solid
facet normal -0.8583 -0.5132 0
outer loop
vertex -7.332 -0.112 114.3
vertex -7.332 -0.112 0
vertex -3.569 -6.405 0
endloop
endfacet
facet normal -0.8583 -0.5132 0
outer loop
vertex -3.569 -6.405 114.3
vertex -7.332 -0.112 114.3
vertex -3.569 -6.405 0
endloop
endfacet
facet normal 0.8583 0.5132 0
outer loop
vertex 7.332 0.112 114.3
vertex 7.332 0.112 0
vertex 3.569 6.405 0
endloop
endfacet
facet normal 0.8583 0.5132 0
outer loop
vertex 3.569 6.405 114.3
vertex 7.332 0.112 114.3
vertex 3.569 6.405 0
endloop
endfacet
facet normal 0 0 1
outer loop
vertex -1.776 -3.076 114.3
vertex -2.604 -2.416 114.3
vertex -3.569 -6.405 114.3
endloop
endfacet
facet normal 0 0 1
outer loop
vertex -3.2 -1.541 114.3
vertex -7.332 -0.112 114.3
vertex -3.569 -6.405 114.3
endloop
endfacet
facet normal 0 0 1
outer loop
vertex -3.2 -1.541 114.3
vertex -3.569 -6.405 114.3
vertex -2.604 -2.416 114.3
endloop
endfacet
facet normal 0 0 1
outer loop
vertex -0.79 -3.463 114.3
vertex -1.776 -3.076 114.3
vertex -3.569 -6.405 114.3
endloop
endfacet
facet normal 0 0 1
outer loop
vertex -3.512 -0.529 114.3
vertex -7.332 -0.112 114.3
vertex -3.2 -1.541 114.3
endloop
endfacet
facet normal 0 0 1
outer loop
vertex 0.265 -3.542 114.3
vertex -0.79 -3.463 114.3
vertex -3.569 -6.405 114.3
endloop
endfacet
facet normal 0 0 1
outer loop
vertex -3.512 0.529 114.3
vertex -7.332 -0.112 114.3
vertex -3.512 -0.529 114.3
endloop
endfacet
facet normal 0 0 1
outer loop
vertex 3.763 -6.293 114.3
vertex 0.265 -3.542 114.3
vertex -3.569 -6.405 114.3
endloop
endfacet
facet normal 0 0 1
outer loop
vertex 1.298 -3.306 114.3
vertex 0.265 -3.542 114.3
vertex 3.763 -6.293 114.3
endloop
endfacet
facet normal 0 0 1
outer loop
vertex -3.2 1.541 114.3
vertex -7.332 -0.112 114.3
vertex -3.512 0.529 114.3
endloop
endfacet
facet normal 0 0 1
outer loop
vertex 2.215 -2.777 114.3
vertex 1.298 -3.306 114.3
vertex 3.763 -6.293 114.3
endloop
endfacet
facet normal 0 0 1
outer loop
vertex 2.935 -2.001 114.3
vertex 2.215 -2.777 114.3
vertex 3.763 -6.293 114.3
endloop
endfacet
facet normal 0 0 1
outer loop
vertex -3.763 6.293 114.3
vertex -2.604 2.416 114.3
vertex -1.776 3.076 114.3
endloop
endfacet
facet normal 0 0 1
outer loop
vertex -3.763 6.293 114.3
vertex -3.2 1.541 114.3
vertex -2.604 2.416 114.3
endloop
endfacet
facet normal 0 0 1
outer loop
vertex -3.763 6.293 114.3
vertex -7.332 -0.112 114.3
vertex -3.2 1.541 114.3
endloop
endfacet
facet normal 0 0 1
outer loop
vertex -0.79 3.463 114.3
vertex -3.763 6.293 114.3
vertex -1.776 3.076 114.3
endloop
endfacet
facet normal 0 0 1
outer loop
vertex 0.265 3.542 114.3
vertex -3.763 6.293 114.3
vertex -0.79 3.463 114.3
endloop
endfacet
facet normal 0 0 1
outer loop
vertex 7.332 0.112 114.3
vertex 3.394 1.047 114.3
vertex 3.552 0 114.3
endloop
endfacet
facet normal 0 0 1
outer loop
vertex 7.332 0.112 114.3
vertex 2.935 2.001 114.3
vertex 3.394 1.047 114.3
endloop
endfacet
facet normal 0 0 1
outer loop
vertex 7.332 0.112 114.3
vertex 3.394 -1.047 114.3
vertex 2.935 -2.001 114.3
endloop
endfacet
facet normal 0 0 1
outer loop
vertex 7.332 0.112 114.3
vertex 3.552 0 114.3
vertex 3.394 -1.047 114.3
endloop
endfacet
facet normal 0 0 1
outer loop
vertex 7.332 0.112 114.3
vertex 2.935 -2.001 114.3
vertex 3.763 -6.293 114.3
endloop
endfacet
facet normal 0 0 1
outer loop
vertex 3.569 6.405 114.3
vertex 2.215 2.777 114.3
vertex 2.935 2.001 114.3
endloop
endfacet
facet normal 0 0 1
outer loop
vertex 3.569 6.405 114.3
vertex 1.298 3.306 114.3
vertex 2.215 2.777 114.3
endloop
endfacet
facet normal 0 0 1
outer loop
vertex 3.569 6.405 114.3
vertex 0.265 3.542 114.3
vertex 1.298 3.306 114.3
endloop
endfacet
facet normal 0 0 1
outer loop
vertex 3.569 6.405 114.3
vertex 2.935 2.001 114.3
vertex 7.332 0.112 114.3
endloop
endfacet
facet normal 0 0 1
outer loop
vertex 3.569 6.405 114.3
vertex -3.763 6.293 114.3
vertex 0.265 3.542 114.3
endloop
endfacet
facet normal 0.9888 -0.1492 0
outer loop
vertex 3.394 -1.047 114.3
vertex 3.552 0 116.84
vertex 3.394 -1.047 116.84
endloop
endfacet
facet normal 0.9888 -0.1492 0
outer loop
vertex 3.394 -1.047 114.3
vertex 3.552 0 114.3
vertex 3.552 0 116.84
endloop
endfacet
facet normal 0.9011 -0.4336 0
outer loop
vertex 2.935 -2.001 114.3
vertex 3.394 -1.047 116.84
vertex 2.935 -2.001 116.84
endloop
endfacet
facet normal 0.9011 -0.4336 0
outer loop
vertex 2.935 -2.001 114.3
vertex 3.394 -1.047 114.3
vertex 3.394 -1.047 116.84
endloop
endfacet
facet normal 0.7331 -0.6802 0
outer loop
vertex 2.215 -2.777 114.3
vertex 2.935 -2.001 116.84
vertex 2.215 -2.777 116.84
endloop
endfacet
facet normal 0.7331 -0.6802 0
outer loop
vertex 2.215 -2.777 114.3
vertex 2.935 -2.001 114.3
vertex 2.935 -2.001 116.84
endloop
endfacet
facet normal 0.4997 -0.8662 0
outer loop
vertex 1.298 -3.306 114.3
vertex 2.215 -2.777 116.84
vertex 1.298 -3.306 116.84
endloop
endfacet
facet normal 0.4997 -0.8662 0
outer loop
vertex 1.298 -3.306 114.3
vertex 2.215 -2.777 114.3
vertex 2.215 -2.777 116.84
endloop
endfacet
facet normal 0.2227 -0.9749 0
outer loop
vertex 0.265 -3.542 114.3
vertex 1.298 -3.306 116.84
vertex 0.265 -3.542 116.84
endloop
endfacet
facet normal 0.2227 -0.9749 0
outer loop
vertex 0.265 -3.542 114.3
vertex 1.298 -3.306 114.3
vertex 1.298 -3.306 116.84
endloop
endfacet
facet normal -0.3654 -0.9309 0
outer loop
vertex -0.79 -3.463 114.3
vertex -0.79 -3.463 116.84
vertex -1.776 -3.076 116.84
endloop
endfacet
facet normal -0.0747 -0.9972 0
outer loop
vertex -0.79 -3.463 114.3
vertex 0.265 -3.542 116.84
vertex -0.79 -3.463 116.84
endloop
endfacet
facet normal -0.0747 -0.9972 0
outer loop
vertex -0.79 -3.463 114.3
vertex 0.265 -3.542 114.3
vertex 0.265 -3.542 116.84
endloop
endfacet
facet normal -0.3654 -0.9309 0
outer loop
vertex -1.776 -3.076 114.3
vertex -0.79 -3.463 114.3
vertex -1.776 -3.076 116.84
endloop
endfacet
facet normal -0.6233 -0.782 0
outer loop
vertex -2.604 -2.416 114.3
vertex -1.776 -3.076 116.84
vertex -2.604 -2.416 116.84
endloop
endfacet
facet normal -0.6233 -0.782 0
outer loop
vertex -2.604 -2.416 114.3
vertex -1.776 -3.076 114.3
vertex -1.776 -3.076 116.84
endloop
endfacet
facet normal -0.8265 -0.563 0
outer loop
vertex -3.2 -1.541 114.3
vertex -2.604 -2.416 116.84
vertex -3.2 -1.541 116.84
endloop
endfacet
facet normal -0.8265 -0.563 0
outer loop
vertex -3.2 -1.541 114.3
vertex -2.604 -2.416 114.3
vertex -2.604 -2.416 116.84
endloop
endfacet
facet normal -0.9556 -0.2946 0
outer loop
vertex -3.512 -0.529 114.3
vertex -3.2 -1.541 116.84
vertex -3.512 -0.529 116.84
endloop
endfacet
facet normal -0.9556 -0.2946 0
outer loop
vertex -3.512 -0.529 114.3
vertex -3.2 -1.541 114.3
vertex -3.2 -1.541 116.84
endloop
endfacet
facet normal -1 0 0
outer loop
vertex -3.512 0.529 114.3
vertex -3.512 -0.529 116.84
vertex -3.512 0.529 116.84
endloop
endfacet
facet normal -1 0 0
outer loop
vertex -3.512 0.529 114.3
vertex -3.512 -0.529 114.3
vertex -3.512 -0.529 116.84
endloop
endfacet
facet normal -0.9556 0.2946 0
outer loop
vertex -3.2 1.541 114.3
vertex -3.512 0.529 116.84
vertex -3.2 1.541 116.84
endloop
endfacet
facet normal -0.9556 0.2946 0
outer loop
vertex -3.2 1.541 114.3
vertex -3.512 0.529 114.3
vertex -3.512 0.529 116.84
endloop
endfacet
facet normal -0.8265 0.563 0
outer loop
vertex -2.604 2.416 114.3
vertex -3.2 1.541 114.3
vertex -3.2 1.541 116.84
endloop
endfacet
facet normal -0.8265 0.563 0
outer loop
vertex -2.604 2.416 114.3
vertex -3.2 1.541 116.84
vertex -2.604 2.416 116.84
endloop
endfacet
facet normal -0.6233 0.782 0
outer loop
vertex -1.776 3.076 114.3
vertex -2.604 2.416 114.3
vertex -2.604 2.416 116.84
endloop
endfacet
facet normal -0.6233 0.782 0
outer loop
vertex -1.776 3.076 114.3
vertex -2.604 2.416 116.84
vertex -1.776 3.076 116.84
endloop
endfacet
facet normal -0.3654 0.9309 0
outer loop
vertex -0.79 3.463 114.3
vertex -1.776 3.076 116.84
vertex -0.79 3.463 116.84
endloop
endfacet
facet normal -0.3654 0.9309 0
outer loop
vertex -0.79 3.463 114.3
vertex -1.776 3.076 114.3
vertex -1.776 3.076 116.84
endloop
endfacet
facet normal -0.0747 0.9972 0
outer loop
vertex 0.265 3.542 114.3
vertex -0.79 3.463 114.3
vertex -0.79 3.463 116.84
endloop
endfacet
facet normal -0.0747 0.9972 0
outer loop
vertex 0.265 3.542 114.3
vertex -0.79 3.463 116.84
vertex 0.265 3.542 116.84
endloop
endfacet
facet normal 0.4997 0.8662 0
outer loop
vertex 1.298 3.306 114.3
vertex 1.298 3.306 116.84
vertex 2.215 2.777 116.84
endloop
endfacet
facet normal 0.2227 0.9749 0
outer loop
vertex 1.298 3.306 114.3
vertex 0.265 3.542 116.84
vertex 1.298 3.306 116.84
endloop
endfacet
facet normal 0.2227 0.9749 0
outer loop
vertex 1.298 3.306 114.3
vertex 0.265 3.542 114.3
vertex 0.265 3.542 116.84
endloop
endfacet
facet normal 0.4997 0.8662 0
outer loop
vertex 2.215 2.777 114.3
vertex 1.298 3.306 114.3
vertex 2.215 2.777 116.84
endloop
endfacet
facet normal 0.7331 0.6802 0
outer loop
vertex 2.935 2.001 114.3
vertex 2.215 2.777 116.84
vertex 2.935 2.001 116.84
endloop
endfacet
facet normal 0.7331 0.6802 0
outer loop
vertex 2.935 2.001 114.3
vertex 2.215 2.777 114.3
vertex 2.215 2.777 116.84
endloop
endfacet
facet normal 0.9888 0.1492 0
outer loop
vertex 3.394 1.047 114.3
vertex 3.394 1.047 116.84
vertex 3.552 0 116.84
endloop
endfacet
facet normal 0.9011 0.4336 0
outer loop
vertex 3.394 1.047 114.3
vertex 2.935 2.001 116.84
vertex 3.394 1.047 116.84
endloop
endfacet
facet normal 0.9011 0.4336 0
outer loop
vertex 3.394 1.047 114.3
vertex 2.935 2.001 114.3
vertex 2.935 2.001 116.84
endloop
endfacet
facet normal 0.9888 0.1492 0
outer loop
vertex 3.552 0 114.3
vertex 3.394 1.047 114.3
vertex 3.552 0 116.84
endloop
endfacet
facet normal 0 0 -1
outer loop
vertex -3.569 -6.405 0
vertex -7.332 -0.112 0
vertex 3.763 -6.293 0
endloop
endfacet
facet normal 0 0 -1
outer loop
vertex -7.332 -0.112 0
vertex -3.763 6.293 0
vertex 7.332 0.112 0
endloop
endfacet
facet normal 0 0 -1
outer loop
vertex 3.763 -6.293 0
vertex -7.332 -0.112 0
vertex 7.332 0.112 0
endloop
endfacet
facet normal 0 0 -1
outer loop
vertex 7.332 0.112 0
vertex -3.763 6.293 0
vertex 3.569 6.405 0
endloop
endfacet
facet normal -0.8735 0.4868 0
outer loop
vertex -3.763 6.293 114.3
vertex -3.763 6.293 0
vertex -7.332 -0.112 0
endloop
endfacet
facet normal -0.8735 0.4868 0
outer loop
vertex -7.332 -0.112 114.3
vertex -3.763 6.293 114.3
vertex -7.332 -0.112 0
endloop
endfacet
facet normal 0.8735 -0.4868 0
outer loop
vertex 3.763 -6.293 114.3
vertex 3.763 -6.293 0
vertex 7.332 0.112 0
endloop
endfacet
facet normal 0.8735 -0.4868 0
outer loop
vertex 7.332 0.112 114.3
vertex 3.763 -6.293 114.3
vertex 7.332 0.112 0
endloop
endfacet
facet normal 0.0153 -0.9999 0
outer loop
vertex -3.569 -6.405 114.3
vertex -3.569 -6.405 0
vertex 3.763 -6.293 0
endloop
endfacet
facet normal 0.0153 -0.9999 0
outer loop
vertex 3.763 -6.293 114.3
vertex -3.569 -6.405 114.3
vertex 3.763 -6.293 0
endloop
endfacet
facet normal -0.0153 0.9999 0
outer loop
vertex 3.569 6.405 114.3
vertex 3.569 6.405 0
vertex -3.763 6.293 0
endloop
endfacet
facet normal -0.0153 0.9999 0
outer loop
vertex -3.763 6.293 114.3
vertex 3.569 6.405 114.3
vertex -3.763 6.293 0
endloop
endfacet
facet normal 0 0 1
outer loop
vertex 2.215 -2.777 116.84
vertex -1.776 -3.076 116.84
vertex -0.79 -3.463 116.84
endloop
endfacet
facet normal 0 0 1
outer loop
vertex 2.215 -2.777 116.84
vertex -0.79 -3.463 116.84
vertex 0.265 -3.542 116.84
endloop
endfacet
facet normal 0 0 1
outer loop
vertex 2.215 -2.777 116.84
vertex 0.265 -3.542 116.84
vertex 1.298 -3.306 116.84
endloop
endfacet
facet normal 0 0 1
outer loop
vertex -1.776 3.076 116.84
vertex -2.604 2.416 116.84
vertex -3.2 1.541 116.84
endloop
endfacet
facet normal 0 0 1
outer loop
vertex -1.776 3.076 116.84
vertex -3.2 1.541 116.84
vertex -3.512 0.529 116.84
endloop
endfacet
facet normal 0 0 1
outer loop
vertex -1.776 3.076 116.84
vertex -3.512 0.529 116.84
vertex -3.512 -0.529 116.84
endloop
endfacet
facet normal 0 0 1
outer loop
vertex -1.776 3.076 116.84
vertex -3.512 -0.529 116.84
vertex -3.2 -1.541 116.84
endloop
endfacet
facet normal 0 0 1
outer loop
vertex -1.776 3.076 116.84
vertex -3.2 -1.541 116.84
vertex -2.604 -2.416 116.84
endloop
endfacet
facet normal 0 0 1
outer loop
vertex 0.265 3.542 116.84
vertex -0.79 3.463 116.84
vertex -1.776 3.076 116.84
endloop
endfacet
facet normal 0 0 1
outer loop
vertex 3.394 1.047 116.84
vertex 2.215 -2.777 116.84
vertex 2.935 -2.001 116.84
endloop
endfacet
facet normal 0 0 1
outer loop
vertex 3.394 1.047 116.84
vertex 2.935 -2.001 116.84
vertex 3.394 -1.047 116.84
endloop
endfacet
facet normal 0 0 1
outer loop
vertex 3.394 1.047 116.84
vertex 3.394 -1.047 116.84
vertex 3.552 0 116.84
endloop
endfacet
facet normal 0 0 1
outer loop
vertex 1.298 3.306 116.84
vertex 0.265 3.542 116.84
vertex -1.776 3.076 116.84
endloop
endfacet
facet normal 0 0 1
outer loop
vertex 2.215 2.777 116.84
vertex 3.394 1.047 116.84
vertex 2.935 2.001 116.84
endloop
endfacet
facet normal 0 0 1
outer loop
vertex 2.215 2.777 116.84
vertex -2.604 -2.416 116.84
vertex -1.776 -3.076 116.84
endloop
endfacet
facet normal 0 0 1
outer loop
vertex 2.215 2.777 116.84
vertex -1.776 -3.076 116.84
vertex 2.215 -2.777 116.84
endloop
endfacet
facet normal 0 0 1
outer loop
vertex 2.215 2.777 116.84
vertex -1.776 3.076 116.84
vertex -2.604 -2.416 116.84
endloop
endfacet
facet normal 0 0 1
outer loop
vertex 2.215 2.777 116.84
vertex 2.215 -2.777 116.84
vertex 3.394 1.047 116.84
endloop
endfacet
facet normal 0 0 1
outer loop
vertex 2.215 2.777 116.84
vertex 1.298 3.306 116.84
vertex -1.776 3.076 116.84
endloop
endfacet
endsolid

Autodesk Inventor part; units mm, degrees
ref_plane "YZ Plane" through (0, 0, 0) normal (1, 0, 0) x (0, 1, 0)
ref_plane "XZ Plane" through (0, 0, 0) normal (0, 1, 0) x (-1, 0, 0)
ref_plane "XY Plane" through (0, 0, 0) normal (0, 0, 1) x (1, 0, 0)
sketch "Sketch1" plane through (0, 0, 0) normal (0, 0, 1) x (1, 0, 0)
  line L0 (-3.7629, 6.2932) -> (3.5686, 6.4054)
  line L1 (3.5686, 6.4054) -> (7.3315, 0.1122)
  line L2 (7.3315, 0.1122) -> (3.7629, -6.2932)
  line L3 (3.7629, -6.2932) -> (-3.5686, -6.4054)
  line L4 (-3.5686, -6.4054) -> (-7.3315, -0.1122)
  line L5 (-7.3315, -0.1122) -> (-3.7629, 6.2932)
  point P0 (0, 0)
  point P1 (0, 0)
  dimension "d0" = 12.7
extrude "Extrusion1" add sketch "Sketch1" along normal blind 101.6
sketch "Sketch2" plane through (0, 0, 101.6) normal (0, 0, 1) x (1, 0, 0)
  circle A0 centre (0, 0) radius 4.1084
extrude "Extrusion2" add sketch "Sketch2" along normal blind 0.254
sketch "Sketch3" plane through (0, 0, 101.6) normal (0, 0, 1) x (1, 0, 0)
  line L0 (3.5686, 6.4054) -> (-3.7629, 6.2932) projected
  line L1 (-3.7629, 6.2932) -> (-7.3315, -0.1122) projected
  line L2 (-7.3315, -0.1122) -> (-3.5686, -6.4054) projected
  line L3 (-3.5686, -6.4054) -> (3.7629, -6.2932) projected
  line L4 (3.7629, -6.2932) -> (7.3315, 0.1122) projected
  line L5 (7.3315, 0.1122) -> (3.5686, 6.4054) projected
extrude "Extrusion3" add sketch "Sketch3" along normal blind 12.7
sketch "Sketch4" plane through (0, 0, 114.3) normal (0, 0, 1) x (1, 0, 0)
  circle A0 centre (0, 0) radius 3.5518
extrude "Extrusion4" add sketch "Sketch4" along normal blind 2.54
properties part number "4.5 hex shaft" material "Aluminum 6061"
